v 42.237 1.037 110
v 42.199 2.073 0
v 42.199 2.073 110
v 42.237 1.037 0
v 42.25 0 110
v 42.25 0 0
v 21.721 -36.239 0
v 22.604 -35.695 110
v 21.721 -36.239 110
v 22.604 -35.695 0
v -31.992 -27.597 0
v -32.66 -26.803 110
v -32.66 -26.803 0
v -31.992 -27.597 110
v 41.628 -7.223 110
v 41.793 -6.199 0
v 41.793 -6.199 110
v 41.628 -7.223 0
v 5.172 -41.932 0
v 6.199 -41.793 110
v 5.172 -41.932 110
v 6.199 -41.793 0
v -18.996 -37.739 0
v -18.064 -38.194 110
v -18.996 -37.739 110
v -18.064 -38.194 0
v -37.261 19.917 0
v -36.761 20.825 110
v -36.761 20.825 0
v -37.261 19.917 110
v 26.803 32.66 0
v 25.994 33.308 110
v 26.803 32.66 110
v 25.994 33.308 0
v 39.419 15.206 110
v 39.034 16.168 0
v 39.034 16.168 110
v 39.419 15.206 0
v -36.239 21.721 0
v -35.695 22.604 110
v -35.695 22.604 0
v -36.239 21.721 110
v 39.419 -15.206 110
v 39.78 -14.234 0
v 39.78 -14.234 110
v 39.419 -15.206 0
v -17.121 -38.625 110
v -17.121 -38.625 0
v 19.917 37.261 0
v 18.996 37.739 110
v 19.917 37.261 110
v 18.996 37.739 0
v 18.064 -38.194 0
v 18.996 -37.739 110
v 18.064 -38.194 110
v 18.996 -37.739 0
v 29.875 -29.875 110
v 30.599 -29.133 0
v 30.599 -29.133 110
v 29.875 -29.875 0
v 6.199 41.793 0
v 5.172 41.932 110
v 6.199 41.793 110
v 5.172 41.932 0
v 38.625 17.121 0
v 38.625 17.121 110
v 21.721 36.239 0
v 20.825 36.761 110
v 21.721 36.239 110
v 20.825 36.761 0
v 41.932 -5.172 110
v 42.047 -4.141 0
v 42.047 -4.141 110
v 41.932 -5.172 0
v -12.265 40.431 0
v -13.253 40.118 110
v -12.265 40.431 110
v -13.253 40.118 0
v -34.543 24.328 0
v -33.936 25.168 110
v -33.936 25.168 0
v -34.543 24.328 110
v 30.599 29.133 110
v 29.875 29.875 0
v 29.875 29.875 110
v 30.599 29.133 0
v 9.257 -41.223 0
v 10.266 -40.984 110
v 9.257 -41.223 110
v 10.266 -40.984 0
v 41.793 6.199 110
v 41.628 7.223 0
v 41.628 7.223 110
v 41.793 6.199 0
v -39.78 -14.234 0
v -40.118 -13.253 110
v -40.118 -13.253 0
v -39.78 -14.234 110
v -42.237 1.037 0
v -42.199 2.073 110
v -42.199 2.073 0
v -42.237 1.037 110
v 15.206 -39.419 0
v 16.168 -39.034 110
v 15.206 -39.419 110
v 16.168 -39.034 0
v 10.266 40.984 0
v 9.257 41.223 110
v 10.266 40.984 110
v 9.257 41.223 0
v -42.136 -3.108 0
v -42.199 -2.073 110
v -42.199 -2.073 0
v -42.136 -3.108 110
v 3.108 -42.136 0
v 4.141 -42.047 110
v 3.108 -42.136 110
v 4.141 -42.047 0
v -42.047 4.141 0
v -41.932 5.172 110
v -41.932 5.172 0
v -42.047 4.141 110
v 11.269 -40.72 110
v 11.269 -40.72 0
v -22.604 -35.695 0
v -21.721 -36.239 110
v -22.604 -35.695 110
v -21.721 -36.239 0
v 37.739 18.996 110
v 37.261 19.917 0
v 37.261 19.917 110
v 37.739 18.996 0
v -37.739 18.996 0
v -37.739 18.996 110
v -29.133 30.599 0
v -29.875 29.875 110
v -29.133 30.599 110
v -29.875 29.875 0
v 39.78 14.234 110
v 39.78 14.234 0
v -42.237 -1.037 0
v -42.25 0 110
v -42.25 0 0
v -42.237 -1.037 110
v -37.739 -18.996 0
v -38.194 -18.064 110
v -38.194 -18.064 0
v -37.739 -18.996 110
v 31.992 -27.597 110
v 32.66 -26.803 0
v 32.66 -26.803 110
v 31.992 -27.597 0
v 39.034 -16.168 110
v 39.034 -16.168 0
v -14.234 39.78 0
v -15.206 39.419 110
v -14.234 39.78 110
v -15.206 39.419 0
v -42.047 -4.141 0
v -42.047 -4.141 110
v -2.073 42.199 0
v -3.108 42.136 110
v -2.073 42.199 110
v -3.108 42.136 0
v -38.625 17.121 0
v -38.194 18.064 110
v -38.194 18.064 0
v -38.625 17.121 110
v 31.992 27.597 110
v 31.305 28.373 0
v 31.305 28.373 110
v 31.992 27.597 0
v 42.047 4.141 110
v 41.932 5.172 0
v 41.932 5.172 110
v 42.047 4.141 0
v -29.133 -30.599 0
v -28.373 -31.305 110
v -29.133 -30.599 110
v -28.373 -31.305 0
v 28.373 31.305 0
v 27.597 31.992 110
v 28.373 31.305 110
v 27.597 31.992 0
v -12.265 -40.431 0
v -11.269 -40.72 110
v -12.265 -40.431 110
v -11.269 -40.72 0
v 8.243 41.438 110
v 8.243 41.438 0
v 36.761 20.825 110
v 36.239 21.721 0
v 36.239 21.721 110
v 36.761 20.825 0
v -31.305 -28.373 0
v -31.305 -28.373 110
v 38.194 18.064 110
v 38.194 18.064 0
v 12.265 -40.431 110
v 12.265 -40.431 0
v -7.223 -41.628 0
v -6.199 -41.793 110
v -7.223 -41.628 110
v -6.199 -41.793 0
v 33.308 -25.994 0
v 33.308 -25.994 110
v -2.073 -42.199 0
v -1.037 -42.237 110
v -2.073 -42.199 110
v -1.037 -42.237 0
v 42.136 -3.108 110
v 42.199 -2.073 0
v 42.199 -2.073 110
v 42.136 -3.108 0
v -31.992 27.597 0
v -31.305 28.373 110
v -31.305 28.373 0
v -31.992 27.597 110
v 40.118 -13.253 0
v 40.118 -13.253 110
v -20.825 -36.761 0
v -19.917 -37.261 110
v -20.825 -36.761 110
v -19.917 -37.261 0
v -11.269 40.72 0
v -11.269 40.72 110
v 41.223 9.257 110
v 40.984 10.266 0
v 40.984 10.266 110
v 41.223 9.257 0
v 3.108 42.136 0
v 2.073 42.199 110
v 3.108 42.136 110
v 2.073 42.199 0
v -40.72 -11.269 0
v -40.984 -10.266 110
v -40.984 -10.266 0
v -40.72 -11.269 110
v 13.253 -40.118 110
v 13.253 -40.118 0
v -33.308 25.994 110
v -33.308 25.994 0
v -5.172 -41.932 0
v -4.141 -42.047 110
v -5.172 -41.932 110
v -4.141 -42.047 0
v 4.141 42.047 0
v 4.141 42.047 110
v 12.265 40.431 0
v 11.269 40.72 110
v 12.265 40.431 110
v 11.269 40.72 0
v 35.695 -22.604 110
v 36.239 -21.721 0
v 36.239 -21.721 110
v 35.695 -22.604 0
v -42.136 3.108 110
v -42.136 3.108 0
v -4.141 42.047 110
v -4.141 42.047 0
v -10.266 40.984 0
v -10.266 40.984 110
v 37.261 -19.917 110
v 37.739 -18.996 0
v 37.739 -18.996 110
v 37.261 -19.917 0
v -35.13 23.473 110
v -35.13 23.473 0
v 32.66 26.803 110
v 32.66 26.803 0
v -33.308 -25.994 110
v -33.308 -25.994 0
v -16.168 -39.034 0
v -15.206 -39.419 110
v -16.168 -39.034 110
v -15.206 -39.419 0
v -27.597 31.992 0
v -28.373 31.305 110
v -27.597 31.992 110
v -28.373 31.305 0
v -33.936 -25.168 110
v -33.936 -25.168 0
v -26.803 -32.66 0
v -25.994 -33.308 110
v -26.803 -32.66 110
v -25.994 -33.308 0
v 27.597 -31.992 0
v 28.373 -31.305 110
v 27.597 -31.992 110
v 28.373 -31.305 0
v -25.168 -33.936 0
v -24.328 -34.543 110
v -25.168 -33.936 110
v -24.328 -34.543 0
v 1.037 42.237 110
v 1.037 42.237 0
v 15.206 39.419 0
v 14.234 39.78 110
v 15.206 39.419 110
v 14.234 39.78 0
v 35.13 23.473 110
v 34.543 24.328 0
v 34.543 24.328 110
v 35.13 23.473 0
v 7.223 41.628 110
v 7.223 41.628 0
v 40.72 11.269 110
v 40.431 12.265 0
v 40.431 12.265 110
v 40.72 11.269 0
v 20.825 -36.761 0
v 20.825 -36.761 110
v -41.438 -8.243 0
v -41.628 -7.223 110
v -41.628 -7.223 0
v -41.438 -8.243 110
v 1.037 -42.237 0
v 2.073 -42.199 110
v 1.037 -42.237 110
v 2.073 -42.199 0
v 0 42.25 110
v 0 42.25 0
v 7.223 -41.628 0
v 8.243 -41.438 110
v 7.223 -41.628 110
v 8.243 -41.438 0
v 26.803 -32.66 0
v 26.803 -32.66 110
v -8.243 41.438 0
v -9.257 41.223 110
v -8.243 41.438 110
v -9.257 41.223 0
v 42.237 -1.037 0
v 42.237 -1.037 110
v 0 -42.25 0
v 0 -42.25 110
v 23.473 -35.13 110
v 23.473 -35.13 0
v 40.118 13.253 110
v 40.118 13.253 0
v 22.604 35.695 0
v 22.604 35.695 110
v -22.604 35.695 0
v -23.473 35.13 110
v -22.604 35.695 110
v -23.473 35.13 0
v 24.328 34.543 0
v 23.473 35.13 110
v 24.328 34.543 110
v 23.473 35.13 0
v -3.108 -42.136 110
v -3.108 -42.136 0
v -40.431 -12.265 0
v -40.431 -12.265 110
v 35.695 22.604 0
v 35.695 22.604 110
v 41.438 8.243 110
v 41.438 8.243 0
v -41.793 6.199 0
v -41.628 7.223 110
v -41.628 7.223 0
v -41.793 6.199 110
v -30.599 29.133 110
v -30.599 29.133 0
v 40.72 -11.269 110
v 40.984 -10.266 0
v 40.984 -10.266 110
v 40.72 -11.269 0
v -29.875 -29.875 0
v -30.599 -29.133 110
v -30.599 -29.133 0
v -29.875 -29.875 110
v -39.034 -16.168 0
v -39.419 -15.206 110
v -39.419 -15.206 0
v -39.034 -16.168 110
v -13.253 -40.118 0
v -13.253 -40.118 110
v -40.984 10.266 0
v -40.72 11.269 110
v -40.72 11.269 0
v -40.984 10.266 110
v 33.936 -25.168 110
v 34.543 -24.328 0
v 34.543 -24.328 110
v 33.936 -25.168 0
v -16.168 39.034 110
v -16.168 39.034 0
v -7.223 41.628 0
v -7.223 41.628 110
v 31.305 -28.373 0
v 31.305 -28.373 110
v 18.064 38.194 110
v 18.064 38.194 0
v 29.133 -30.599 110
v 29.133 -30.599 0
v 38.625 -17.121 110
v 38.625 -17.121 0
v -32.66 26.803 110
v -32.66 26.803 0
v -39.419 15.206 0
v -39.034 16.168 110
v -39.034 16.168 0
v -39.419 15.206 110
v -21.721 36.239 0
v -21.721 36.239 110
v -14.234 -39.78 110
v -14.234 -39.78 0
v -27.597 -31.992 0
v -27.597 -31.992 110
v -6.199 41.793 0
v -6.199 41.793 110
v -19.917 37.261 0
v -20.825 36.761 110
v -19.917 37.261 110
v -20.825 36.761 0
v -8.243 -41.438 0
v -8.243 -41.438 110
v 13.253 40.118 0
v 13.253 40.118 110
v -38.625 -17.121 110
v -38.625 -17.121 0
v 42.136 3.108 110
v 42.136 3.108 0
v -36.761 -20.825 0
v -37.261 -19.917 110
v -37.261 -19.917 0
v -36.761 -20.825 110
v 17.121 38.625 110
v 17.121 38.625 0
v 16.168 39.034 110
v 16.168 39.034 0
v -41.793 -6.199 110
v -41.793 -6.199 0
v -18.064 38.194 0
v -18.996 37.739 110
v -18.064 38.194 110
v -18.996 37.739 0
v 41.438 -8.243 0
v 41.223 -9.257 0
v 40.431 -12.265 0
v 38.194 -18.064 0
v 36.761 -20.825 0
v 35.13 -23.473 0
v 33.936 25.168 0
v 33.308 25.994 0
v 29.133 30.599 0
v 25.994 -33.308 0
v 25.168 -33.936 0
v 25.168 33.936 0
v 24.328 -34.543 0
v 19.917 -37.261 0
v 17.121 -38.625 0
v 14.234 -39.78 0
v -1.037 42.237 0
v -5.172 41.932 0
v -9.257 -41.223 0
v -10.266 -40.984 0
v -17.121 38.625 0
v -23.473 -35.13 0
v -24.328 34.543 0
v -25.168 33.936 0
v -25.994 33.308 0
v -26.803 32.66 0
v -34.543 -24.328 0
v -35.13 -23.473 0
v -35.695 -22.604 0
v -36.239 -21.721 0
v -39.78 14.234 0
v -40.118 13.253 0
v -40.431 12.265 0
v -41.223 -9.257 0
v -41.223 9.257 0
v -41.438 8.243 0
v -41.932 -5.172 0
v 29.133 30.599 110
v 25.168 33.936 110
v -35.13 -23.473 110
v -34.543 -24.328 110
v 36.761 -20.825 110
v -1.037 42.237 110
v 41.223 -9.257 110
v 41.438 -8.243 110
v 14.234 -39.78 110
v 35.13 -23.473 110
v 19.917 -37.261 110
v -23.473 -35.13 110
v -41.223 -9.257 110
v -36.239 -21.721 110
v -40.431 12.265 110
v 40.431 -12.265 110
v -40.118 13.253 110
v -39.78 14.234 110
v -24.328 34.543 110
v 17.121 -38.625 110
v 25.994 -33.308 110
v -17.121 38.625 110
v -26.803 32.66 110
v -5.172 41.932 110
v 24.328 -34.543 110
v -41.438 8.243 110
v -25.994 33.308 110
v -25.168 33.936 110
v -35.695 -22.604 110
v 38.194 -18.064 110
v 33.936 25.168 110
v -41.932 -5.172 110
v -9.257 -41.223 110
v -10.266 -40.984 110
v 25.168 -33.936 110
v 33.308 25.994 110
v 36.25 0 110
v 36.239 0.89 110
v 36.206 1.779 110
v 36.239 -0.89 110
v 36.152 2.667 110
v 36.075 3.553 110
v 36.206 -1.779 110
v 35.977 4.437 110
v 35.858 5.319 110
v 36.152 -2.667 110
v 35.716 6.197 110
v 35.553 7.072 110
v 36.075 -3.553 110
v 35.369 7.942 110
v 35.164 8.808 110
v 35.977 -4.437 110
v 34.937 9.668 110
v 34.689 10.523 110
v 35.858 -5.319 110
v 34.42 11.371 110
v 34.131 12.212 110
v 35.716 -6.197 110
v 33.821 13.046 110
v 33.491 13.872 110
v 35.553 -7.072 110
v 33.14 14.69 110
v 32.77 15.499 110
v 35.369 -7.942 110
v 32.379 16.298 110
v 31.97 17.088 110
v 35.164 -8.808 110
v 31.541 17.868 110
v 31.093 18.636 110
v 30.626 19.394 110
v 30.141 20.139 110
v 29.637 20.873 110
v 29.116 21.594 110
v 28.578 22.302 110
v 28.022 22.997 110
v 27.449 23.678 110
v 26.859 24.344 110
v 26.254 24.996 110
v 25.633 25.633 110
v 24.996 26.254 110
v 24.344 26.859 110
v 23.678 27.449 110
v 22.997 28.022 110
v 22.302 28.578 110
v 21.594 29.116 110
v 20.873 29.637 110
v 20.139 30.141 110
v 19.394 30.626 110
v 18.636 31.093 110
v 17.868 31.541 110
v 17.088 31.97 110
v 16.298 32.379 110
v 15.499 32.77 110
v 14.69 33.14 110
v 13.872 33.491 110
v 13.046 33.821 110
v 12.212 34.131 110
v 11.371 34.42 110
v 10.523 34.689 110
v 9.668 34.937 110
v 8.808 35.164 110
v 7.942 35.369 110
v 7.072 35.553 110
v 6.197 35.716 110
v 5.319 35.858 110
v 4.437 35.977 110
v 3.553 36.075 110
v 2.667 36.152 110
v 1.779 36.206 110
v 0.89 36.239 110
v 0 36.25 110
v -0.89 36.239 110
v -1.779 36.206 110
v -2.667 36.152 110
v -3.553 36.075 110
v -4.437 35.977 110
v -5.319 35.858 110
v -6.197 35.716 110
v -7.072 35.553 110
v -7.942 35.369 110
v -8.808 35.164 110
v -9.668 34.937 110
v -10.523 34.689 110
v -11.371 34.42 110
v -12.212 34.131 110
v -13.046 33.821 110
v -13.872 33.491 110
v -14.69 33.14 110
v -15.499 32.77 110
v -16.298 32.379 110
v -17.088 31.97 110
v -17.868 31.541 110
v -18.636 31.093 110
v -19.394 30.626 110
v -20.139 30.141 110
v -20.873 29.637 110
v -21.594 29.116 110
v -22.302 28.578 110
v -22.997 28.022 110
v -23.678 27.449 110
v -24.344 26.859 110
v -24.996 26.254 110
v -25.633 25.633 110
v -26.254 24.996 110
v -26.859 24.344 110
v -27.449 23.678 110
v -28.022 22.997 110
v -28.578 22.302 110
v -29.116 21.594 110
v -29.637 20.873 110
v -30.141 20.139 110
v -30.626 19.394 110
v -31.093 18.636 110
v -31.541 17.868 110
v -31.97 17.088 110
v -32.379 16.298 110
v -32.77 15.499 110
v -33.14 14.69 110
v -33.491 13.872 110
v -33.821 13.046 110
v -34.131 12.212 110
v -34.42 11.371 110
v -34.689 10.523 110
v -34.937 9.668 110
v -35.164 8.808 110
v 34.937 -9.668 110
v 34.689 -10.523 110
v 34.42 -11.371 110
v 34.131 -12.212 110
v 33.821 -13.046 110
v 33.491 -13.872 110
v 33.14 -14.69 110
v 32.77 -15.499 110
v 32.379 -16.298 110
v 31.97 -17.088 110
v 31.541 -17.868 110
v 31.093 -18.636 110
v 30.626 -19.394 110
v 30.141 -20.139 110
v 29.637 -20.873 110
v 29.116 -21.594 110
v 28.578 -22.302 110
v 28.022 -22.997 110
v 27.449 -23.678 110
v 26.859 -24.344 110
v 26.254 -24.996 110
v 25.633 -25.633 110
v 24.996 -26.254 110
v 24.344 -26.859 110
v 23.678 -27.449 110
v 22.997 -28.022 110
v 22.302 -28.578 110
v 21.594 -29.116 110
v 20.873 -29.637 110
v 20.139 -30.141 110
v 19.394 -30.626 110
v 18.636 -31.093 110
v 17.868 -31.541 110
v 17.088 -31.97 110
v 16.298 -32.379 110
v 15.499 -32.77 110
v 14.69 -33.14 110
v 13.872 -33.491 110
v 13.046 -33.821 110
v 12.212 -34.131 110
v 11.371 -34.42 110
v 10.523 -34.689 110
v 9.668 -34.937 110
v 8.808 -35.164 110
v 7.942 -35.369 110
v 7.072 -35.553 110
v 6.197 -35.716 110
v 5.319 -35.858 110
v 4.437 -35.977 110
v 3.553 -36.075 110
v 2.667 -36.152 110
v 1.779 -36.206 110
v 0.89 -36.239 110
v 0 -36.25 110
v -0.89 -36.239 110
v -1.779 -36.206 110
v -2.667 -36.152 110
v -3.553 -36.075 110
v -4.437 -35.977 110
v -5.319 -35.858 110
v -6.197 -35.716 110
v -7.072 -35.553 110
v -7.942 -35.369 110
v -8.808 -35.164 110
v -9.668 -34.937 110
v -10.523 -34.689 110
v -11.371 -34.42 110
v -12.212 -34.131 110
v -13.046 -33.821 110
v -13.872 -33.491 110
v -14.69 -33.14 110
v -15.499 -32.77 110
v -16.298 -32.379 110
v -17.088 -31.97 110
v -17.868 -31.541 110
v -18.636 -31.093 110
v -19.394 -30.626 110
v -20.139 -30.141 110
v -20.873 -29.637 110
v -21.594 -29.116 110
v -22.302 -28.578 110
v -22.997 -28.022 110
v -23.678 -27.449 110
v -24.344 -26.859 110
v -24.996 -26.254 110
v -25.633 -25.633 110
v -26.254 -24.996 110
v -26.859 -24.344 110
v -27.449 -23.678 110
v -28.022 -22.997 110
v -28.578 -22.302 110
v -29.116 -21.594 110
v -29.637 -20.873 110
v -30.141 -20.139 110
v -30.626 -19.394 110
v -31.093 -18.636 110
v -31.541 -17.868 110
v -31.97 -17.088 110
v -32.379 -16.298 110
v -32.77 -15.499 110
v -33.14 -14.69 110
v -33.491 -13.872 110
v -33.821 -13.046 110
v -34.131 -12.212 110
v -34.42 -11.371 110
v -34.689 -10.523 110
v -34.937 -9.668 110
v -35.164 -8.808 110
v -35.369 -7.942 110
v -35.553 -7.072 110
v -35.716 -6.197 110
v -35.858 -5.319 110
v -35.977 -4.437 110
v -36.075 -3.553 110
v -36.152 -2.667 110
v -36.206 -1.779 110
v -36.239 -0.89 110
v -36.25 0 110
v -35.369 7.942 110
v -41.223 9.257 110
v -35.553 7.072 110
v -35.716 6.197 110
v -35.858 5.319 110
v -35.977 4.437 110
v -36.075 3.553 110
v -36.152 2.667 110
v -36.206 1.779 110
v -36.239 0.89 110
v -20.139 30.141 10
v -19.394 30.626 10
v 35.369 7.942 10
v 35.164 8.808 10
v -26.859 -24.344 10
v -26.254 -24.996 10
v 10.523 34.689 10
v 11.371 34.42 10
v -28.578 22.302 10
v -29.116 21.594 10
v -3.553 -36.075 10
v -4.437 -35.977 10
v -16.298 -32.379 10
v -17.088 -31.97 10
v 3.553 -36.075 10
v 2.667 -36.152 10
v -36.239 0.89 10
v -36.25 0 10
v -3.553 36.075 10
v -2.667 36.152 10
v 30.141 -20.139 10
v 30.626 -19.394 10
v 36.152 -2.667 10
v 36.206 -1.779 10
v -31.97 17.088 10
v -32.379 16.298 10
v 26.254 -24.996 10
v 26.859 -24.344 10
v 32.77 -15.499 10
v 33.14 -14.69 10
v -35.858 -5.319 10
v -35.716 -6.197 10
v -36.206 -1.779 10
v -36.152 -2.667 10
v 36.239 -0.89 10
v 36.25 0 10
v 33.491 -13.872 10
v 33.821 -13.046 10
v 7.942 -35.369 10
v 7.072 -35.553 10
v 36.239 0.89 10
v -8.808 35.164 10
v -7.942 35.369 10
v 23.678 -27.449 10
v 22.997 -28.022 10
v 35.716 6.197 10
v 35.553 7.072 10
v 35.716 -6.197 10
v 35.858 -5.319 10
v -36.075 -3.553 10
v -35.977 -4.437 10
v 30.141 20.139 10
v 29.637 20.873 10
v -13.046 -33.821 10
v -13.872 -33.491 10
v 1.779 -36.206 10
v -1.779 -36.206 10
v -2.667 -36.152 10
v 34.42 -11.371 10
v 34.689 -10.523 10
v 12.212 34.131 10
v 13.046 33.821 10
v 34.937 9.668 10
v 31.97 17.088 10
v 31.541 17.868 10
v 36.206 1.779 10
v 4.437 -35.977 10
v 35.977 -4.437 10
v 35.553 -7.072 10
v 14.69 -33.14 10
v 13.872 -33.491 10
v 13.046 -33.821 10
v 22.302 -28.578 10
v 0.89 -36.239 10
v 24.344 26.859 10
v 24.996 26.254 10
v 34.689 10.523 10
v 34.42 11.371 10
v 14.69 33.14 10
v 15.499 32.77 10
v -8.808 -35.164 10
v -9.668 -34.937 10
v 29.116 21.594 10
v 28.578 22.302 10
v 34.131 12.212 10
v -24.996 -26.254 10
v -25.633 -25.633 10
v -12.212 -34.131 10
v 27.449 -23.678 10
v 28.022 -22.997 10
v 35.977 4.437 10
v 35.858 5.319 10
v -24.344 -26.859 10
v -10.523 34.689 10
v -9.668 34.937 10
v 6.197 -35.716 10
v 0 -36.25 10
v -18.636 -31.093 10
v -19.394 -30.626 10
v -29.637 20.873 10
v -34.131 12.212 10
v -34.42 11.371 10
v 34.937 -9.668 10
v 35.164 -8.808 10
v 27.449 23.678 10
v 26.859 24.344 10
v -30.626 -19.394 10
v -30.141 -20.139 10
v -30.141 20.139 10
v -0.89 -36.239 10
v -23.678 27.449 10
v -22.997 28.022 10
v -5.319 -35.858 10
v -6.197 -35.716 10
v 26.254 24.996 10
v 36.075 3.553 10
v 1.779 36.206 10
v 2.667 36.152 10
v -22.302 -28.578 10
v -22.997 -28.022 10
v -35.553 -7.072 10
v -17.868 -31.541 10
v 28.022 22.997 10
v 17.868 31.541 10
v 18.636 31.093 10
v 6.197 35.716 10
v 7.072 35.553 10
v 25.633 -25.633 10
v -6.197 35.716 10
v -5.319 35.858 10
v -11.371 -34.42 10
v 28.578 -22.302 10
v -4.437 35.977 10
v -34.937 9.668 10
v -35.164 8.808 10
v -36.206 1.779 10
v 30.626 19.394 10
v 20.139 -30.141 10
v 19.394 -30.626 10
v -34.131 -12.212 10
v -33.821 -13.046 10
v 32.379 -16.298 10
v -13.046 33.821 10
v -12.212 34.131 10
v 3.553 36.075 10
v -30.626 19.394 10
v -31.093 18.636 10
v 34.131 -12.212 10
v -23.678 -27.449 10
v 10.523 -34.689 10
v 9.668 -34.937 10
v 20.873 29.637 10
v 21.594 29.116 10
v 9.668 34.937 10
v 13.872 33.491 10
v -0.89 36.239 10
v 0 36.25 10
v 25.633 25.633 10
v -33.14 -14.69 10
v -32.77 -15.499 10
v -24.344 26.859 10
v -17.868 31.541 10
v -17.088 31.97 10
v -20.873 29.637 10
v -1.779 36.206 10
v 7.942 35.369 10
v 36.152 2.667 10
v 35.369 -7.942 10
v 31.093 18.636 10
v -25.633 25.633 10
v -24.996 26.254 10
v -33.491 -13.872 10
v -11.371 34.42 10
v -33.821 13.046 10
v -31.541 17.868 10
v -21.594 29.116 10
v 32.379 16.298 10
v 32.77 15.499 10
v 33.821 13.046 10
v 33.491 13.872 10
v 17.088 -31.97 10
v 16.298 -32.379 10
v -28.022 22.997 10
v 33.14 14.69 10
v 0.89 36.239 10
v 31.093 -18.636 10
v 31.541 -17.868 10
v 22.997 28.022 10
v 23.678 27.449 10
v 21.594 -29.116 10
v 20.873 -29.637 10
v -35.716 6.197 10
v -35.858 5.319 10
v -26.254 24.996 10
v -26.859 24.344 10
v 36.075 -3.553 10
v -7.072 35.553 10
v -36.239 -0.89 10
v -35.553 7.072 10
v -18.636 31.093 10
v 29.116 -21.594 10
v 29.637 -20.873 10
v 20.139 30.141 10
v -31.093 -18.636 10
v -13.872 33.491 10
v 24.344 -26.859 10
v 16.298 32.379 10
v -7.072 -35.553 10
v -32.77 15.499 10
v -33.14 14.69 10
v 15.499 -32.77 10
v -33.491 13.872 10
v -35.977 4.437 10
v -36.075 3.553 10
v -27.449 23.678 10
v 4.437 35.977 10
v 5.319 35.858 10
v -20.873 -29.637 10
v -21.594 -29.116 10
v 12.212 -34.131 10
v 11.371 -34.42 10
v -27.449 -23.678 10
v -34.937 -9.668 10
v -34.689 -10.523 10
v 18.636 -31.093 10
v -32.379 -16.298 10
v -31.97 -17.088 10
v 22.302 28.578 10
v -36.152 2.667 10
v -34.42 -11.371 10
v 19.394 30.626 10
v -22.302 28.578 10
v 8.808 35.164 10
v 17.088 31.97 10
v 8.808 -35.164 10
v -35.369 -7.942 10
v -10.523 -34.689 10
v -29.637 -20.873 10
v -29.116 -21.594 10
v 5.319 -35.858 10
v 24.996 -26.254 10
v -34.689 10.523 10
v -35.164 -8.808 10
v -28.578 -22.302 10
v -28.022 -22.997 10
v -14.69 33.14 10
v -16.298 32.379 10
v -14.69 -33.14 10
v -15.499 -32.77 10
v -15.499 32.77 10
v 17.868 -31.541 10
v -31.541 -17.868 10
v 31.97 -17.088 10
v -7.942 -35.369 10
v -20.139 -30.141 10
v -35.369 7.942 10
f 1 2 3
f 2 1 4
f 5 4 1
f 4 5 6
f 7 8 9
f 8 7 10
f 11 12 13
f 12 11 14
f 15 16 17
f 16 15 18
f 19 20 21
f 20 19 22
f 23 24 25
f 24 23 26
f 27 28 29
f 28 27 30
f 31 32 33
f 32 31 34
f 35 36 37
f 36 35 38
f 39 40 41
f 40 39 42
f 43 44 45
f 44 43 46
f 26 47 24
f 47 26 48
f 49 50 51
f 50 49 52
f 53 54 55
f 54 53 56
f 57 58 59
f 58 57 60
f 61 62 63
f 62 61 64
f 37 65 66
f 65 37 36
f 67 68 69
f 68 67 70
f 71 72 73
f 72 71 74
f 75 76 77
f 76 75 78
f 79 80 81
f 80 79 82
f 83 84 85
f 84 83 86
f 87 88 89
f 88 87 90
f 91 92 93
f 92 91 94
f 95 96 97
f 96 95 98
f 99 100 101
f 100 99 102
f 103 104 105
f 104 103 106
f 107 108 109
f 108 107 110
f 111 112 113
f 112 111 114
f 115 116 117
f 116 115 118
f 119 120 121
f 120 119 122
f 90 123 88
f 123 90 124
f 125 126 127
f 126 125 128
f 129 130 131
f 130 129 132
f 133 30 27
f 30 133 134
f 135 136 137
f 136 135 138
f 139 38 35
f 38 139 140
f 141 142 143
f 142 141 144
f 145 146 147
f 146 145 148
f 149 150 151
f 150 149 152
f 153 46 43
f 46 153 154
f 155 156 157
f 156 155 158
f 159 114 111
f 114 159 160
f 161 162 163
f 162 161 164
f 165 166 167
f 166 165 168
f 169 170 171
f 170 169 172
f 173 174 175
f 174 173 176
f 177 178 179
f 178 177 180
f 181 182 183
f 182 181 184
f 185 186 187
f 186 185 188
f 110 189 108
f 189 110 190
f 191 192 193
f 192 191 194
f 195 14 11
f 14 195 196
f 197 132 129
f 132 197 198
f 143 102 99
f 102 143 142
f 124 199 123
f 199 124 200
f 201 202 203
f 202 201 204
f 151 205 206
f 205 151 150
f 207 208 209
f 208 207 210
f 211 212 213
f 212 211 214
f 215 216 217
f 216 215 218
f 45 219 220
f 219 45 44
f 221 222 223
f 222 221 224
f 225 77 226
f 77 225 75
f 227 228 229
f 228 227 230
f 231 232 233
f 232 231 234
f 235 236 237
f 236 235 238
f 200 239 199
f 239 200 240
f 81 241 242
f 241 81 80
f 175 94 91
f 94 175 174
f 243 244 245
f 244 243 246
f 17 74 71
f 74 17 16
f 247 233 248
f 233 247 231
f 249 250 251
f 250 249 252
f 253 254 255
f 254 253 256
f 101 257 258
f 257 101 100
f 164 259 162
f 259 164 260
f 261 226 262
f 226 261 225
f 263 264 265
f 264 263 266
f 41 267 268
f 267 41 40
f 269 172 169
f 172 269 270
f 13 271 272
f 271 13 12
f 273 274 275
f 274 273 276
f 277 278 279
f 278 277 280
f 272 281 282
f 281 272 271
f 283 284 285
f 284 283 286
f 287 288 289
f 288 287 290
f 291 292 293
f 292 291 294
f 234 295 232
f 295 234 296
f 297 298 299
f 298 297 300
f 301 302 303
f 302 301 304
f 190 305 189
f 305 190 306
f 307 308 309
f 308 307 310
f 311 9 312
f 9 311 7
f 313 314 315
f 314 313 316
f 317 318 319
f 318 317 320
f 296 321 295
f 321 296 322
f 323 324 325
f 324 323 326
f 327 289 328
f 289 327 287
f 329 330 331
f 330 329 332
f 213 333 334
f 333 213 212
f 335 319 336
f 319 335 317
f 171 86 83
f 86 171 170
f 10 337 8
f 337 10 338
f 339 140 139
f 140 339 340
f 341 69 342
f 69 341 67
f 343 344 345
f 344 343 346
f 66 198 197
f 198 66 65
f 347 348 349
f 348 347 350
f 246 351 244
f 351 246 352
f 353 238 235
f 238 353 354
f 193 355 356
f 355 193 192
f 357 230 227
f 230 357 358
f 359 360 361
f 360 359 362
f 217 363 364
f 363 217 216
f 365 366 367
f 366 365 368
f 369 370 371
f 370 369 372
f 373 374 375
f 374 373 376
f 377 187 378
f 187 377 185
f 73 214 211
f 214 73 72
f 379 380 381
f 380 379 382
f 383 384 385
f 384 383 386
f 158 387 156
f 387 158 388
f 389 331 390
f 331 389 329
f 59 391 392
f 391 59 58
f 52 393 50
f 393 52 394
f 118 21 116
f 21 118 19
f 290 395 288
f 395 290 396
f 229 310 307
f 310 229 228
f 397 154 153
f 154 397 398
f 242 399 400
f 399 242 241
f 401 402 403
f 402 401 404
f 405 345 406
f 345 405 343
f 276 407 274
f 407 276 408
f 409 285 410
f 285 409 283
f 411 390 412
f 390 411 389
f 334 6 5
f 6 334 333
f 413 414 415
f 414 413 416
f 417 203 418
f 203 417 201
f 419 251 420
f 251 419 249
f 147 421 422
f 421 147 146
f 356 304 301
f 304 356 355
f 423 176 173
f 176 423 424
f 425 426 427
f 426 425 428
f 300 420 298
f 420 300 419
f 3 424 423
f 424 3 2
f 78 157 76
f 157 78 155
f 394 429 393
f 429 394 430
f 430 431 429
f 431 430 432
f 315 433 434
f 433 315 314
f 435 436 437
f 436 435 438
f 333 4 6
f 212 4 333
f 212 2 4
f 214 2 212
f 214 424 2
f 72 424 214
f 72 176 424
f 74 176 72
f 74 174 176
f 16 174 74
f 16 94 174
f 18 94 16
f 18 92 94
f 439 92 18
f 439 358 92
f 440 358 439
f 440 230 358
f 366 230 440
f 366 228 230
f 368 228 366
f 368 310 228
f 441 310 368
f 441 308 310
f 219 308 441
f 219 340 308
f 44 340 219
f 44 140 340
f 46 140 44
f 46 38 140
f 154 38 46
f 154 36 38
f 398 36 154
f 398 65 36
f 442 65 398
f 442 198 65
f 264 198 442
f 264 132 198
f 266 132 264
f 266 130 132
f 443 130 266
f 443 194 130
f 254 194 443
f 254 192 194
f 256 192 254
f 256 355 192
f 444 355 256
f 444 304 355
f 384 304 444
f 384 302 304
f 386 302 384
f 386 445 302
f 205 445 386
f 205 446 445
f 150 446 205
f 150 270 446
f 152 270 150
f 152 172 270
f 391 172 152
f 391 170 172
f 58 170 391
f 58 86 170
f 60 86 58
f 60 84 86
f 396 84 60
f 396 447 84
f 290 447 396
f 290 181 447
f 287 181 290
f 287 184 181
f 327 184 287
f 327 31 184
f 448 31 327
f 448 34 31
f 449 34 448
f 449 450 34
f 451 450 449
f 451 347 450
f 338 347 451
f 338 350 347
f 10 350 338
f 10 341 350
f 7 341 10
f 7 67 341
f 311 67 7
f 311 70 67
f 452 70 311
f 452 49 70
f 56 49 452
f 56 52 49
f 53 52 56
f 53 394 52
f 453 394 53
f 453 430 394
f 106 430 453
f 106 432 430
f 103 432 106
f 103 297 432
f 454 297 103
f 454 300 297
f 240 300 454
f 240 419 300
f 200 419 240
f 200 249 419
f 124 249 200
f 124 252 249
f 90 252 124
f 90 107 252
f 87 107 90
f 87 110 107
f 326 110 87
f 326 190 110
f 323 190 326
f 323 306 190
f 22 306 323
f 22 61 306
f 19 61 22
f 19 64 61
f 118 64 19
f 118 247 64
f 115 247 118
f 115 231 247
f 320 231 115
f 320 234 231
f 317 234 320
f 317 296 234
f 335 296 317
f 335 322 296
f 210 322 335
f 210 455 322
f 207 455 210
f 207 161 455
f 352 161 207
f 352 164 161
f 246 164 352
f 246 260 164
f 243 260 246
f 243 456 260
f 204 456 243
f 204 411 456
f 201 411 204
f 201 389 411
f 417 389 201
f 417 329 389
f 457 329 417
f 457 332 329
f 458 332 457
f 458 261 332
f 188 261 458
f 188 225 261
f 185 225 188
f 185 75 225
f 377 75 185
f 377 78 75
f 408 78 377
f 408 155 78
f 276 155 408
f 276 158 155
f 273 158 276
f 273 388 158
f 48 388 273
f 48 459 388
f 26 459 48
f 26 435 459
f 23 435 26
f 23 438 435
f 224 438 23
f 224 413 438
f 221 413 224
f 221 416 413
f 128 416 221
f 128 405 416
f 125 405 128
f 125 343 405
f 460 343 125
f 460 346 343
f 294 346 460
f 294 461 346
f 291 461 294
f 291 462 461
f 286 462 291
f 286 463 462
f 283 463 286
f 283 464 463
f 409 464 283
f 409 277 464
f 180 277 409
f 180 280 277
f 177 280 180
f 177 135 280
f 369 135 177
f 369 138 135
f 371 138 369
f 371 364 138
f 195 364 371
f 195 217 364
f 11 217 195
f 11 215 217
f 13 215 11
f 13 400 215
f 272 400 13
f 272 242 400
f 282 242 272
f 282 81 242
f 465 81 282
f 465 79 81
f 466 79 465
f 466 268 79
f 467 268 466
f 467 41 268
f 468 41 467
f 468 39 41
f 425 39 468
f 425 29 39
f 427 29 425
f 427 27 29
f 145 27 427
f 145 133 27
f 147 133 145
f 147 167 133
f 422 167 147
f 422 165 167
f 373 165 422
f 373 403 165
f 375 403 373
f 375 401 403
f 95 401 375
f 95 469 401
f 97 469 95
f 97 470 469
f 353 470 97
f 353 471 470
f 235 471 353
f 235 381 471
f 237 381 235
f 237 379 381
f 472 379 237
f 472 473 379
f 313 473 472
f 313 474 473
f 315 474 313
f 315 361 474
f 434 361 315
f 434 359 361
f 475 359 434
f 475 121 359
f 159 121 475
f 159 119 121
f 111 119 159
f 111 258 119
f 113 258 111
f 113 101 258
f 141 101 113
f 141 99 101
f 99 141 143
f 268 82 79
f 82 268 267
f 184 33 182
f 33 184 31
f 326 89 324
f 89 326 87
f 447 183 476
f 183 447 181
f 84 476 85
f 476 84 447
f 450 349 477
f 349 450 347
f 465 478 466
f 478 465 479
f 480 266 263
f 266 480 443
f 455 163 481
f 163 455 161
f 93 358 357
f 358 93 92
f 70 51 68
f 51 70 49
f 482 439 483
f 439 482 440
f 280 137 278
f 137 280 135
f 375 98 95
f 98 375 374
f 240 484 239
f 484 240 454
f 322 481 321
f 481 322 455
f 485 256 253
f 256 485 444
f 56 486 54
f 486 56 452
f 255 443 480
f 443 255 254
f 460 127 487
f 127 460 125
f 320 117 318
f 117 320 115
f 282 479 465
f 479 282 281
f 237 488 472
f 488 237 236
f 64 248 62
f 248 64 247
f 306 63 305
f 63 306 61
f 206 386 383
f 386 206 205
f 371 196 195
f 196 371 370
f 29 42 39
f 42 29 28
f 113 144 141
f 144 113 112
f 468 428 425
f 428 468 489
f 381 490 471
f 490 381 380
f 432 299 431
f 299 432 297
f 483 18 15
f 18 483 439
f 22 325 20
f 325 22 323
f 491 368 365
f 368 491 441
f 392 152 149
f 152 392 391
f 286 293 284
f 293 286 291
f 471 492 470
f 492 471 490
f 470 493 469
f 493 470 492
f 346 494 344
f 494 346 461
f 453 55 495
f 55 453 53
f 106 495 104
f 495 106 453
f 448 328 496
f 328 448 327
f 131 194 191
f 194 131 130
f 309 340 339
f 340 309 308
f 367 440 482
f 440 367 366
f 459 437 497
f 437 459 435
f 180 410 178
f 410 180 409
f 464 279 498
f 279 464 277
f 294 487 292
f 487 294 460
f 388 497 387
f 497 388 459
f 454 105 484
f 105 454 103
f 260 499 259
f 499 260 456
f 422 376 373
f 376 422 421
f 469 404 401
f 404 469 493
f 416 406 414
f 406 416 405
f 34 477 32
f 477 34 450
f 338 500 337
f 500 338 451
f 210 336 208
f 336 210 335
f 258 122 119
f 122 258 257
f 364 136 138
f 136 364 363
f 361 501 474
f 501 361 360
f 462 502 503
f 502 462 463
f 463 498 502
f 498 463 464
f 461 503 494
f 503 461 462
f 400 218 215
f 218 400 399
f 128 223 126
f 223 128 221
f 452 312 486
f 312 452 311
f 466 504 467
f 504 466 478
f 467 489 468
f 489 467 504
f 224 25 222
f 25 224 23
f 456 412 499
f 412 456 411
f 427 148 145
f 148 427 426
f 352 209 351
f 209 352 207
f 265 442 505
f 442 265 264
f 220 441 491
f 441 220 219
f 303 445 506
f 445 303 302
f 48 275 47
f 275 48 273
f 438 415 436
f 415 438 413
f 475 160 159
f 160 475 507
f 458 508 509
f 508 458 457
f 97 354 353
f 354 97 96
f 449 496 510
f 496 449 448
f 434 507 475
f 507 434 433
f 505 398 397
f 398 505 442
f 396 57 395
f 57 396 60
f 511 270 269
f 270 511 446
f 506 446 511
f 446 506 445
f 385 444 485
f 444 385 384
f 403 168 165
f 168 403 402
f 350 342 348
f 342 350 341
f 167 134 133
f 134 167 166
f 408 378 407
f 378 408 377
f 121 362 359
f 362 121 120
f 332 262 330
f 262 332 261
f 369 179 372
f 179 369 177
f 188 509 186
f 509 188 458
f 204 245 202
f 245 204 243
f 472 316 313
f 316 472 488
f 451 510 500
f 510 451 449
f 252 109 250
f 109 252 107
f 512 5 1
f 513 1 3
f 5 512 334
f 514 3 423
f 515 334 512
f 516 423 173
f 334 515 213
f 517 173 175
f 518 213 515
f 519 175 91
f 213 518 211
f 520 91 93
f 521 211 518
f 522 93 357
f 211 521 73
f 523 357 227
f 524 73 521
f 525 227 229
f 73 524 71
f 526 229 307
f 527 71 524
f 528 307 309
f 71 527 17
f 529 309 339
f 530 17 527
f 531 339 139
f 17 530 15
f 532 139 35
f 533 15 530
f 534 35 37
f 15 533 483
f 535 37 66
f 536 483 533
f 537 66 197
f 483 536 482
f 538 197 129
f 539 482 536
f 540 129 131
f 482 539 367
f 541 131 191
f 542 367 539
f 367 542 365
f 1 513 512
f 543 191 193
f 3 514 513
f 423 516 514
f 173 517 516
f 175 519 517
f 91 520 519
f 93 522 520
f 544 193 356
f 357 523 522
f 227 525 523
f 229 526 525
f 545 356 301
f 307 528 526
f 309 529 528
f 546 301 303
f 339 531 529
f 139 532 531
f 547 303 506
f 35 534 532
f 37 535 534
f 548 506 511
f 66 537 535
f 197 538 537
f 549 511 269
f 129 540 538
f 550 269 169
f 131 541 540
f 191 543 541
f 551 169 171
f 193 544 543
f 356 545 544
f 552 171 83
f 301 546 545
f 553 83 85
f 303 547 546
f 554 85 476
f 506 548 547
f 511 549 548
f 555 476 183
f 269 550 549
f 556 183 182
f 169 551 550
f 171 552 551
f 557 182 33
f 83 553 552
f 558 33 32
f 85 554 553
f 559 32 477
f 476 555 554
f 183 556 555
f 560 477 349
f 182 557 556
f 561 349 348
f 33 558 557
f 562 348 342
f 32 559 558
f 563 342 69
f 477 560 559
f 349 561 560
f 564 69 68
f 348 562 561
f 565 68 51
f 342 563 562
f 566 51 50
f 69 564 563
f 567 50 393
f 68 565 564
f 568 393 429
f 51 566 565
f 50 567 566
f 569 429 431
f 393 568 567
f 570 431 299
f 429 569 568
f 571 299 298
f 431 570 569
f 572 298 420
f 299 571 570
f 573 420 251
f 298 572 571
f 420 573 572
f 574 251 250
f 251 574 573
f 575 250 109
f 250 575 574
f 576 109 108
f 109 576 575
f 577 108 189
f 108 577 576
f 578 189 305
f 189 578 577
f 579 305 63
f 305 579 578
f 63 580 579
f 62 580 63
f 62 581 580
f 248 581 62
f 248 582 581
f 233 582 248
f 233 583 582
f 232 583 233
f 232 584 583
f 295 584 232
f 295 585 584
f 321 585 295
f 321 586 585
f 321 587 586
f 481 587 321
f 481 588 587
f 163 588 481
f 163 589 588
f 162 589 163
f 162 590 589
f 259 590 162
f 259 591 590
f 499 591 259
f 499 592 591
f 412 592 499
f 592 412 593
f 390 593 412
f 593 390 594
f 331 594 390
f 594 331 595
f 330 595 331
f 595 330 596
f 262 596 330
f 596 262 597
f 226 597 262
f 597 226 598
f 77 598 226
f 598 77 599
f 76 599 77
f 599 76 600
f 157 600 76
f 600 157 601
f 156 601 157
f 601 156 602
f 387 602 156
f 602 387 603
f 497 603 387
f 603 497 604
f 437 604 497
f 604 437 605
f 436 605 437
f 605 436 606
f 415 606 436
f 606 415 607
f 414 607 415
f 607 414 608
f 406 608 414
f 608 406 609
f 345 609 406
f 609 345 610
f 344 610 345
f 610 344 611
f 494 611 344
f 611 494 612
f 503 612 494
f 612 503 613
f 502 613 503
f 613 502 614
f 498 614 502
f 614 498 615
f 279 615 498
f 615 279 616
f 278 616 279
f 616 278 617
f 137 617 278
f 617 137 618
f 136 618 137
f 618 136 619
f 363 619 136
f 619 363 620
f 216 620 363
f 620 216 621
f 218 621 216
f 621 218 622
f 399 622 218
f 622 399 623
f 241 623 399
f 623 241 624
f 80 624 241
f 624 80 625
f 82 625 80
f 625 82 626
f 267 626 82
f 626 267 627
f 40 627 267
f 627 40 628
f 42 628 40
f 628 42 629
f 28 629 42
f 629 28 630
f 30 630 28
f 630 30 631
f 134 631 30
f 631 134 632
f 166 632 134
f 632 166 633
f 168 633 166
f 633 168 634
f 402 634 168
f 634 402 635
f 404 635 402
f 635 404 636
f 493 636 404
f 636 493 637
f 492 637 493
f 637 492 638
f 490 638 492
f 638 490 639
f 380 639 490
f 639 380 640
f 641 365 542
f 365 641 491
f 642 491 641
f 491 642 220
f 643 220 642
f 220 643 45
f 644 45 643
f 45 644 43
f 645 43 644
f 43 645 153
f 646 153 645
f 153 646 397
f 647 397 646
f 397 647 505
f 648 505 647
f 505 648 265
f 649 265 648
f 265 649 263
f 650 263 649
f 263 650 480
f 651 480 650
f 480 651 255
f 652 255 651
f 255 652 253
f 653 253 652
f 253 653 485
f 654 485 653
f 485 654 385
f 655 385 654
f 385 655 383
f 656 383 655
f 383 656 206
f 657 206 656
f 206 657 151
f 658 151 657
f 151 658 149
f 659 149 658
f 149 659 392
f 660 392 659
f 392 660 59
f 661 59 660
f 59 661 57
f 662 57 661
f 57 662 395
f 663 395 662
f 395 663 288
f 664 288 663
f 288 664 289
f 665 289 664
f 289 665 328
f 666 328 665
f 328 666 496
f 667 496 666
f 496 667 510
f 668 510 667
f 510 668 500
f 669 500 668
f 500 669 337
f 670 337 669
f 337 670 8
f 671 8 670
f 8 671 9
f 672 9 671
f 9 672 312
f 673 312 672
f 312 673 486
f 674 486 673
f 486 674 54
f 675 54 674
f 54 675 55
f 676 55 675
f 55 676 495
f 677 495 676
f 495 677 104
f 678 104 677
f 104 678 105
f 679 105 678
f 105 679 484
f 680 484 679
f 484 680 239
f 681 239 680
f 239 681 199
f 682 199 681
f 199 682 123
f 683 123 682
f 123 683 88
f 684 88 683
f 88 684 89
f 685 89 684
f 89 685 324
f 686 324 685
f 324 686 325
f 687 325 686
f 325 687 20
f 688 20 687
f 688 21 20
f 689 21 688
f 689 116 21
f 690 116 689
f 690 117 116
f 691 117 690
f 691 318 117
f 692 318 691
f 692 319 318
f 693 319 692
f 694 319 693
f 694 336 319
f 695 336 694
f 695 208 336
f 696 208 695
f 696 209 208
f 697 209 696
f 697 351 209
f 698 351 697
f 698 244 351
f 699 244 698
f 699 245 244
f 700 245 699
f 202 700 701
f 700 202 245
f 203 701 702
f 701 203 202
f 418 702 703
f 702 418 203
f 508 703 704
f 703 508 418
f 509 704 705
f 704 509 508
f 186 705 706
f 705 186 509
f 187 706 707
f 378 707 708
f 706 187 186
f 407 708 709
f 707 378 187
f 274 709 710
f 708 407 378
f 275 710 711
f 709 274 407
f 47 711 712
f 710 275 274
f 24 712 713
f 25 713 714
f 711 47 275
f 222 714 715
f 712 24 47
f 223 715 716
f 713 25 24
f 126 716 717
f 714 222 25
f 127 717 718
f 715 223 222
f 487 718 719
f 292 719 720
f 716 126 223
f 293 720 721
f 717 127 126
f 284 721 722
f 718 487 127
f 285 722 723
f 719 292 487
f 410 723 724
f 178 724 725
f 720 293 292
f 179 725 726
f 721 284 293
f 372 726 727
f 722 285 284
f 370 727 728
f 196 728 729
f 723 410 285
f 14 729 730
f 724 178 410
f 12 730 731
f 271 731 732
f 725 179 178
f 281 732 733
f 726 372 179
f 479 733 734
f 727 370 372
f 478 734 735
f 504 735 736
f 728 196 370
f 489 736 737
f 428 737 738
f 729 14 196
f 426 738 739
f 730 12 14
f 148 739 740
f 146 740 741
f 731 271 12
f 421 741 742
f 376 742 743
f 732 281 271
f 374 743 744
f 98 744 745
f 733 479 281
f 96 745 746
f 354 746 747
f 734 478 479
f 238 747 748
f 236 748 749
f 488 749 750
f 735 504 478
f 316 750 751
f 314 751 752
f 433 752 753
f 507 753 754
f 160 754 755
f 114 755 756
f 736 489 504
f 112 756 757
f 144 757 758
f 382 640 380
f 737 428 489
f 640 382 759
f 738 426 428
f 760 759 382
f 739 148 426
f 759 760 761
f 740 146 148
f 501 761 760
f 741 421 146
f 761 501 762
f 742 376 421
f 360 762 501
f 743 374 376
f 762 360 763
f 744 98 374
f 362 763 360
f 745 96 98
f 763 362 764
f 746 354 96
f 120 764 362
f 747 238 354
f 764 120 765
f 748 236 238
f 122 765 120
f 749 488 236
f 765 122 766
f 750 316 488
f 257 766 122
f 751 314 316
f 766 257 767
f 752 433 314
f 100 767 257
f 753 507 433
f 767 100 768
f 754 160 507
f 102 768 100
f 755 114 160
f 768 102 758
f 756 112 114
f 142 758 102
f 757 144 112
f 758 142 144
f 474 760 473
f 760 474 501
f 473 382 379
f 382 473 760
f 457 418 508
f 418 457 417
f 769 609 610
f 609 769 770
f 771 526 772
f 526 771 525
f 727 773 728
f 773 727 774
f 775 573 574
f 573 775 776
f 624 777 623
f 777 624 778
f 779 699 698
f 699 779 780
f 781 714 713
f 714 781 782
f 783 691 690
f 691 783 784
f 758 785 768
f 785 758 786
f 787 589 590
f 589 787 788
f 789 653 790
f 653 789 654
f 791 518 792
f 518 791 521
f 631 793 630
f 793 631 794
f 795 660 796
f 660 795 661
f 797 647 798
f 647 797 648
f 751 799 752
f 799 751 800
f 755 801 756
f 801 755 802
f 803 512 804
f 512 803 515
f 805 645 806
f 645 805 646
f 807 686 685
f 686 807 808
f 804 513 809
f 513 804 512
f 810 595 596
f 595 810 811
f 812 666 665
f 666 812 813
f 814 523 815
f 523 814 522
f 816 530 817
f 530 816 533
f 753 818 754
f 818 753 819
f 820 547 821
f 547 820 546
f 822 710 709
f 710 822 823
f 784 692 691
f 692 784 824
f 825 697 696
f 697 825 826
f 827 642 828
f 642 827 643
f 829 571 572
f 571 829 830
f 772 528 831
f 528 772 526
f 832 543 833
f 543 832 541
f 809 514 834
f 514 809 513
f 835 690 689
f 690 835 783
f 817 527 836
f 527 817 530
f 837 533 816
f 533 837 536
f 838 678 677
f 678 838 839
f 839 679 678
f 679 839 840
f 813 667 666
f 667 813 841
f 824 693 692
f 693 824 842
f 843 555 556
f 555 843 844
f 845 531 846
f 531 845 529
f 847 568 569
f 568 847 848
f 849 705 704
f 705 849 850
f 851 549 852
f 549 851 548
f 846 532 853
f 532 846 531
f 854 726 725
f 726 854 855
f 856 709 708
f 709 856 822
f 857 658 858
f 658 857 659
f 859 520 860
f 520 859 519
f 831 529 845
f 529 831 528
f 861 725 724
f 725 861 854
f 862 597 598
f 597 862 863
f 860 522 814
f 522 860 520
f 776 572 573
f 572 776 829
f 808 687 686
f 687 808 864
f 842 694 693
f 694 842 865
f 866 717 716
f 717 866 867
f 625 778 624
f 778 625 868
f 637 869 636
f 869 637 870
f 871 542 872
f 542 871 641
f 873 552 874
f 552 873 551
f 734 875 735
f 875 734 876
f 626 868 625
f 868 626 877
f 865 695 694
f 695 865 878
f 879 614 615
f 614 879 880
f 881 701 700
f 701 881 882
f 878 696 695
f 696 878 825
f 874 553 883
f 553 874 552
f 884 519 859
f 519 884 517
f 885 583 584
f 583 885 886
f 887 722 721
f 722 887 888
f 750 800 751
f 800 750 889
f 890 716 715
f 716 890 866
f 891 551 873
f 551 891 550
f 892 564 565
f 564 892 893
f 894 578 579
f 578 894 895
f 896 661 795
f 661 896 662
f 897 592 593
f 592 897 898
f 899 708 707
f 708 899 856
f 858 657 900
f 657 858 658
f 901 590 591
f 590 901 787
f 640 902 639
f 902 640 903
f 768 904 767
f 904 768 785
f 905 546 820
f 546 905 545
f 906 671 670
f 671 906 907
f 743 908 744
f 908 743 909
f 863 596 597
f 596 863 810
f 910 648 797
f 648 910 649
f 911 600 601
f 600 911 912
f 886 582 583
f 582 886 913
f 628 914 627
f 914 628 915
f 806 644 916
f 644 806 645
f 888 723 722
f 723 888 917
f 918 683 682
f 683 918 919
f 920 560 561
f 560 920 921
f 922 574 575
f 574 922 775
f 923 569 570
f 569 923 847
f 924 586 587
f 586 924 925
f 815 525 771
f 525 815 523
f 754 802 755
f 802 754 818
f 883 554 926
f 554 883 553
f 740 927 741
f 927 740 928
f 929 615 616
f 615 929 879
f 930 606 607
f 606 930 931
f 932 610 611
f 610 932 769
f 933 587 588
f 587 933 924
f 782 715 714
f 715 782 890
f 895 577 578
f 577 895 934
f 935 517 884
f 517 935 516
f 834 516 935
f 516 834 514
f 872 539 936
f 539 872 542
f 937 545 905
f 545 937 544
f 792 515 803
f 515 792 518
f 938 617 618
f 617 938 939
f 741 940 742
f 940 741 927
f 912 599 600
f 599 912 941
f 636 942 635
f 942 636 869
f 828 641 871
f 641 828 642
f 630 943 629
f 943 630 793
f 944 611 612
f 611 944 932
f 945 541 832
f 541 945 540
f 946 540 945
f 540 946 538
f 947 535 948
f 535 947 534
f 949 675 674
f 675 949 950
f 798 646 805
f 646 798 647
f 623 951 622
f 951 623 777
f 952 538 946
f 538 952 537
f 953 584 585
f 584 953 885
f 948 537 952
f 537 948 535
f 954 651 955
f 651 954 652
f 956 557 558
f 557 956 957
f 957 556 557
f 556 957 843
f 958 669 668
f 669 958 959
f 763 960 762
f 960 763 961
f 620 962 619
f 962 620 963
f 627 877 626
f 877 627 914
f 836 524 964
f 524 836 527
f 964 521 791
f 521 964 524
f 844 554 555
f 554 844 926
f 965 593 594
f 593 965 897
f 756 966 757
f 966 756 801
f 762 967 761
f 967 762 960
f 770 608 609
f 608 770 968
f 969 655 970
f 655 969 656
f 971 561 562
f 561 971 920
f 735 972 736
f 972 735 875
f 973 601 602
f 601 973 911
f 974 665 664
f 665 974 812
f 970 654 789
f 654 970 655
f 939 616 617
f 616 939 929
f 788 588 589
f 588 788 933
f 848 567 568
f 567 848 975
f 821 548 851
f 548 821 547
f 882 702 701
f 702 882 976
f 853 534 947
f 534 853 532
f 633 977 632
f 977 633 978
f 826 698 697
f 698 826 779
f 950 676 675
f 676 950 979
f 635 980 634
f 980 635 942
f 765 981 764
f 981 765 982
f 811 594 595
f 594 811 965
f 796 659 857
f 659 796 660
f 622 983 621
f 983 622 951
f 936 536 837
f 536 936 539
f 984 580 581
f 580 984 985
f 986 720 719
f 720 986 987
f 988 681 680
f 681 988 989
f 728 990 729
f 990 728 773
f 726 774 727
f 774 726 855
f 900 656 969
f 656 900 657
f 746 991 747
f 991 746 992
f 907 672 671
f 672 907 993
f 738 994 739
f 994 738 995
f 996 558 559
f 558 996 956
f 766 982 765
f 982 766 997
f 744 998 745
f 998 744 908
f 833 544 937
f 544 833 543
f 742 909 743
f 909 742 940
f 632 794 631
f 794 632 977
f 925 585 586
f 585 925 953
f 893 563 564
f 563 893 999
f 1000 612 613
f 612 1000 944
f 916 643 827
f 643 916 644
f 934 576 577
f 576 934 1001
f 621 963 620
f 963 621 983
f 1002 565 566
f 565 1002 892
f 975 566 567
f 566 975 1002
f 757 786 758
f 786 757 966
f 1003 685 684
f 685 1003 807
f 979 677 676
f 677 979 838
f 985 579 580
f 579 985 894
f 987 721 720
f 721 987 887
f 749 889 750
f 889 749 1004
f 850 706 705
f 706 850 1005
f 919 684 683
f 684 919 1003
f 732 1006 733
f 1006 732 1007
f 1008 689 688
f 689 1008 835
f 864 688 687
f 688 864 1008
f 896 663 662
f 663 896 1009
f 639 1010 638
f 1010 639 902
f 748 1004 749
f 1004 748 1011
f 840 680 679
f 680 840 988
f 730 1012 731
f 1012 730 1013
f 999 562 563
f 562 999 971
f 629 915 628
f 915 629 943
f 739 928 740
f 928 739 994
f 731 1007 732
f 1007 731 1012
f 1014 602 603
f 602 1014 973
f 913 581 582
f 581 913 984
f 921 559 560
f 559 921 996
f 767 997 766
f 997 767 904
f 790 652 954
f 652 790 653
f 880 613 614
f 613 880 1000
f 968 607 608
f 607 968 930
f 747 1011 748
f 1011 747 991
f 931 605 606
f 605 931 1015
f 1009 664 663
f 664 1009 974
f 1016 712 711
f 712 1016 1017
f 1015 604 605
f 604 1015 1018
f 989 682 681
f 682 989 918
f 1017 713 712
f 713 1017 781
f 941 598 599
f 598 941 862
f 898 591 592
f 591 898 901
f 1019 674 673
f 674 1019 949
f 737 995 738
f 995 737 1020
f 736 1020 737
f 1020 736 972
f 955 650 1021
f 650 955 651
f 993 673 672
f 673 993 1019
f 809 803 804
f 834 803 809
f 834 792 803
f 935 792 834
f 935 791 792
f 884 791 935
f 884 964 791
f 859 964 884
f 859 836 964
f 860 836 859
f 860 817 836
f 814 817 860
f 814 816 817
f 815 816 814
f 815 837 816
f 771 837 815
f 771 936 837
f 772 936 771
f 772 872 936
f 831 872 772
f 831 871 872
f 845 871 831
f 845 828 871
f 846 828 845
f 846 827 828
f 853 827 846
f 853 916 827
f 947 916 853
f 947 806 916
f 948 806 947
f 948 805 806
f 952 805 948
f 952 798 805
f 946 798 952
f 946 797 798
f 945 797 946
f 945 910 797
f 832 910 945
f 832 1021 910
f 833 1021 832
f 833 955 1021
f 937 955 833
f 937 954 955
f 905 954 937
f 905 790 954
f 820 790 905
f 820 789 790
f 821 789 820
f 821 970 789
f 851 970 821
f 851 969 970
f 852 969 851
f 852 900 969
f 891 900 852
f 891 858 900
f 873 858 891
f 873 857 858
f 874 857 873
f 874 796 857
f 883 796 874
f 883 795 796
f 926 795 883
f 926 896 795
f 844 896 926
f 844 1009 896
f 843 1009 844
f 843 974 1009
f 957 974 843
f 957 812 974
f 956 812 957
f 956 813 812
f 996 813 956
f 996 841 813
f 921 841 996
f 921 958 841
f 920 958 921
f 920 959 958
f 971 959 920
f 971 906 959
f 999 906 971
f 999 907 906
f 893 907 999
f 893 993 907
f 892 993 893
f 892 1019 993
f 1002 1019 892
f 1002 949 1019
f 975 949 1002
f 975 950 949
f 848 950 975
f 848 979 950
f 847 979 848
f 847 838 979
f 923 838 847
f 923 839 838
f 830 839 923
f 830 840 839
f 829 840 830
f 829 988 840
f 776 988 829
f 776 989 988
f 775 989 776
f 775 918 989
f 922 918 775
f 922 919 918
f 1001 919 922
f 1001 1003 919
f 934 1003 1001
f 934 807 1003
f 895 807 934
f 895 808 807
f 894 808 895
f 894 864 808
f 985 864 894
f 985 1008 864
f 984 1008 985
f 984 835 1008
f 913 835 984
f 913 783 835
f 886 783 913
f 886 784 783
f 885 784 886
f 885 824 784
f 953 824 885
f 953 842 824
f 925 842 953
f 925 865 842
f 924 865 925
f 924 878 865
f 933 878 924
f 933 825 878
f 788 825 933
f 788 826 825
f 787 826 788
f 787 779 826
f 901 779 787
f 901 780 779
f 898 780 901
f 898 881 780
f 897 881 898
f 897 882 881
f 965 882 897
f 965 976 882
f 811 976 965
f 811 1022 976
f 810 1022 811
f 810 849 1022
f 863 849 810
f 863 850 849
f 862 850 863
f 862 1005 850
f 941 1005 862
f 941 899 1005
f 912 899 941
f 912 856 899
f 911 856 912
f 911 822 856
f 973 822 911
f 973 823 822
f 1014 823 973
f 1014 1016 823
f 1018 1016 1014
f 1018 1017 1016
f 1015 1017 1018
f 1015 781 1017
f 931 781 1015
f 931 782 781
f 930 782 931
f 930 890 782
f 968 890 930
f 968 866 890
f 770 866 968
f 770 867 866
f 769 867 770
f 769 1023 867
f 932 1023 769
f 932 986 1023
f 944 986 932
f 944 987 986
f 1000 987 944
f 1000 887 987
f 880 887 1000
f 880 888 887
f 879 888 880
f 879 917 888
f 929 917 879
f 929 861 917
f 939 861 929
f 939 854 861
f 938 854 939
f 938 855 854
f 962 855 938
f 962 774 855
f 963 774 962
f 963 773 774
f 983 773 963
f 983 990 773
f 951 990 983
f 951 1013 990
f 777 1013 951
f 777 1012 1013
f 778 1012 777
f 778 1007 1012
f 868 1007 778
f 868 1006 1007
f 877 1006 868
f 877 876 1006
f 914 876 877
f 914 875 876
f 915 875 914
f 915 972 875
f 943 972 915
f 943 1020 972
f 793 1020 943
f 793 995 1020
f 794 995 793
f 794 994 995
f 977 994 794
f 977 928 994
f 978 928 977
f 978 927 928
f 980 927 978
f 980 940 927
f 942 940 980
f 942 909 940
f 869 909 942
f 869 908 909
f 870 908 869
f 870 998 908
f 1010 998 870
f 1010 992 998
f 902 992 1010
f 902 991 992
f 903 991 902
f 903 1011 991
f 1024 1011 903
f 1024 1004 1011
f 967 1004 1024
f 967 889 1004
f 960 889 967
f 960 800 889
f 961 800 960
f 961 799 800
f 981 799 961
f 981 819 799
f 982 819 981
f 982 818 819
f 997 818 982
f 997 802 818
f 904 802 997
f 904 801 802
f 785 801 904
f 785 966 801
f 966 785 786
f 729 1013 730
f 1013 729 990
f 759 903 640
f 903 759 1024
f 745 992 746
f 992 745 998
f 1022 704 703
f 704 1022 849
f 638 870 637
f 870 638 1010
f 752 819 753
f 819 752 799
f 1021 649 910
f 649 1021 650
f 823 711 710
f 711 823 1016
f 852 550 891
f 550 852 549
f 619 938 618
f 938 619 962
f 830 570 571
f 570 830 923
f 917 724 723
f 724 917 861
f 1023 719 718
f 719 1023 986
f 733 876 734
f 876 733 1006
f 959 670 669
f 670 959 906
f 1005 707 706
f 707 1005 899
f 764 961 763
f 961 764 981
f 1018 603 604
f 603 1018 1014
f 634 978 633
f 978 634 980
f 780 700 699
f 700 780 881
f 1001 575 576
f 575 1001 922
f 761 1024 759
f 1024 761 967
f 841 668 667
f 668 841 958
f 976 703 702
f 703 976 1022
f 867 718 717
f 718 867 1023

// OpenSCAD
$fn = $preview ? 16 : 256;
preview_fix = $preview ? 0.1 : 0; // preview shows shadows with zero thin layers, so stop that

inner_h = 100;
inner_d = 72.5;
wall    = 6;
bottom  = 10;
outer_d = inner_d + wall*2;
outer_h = inner_h + bottom;

difference() {
    cylinder(h=outer_h, d=outer_d);
    translate([0,0,bottom]) {
        cylinder(h=inner_h+preview_fix, d=inner_d);
    }
}
